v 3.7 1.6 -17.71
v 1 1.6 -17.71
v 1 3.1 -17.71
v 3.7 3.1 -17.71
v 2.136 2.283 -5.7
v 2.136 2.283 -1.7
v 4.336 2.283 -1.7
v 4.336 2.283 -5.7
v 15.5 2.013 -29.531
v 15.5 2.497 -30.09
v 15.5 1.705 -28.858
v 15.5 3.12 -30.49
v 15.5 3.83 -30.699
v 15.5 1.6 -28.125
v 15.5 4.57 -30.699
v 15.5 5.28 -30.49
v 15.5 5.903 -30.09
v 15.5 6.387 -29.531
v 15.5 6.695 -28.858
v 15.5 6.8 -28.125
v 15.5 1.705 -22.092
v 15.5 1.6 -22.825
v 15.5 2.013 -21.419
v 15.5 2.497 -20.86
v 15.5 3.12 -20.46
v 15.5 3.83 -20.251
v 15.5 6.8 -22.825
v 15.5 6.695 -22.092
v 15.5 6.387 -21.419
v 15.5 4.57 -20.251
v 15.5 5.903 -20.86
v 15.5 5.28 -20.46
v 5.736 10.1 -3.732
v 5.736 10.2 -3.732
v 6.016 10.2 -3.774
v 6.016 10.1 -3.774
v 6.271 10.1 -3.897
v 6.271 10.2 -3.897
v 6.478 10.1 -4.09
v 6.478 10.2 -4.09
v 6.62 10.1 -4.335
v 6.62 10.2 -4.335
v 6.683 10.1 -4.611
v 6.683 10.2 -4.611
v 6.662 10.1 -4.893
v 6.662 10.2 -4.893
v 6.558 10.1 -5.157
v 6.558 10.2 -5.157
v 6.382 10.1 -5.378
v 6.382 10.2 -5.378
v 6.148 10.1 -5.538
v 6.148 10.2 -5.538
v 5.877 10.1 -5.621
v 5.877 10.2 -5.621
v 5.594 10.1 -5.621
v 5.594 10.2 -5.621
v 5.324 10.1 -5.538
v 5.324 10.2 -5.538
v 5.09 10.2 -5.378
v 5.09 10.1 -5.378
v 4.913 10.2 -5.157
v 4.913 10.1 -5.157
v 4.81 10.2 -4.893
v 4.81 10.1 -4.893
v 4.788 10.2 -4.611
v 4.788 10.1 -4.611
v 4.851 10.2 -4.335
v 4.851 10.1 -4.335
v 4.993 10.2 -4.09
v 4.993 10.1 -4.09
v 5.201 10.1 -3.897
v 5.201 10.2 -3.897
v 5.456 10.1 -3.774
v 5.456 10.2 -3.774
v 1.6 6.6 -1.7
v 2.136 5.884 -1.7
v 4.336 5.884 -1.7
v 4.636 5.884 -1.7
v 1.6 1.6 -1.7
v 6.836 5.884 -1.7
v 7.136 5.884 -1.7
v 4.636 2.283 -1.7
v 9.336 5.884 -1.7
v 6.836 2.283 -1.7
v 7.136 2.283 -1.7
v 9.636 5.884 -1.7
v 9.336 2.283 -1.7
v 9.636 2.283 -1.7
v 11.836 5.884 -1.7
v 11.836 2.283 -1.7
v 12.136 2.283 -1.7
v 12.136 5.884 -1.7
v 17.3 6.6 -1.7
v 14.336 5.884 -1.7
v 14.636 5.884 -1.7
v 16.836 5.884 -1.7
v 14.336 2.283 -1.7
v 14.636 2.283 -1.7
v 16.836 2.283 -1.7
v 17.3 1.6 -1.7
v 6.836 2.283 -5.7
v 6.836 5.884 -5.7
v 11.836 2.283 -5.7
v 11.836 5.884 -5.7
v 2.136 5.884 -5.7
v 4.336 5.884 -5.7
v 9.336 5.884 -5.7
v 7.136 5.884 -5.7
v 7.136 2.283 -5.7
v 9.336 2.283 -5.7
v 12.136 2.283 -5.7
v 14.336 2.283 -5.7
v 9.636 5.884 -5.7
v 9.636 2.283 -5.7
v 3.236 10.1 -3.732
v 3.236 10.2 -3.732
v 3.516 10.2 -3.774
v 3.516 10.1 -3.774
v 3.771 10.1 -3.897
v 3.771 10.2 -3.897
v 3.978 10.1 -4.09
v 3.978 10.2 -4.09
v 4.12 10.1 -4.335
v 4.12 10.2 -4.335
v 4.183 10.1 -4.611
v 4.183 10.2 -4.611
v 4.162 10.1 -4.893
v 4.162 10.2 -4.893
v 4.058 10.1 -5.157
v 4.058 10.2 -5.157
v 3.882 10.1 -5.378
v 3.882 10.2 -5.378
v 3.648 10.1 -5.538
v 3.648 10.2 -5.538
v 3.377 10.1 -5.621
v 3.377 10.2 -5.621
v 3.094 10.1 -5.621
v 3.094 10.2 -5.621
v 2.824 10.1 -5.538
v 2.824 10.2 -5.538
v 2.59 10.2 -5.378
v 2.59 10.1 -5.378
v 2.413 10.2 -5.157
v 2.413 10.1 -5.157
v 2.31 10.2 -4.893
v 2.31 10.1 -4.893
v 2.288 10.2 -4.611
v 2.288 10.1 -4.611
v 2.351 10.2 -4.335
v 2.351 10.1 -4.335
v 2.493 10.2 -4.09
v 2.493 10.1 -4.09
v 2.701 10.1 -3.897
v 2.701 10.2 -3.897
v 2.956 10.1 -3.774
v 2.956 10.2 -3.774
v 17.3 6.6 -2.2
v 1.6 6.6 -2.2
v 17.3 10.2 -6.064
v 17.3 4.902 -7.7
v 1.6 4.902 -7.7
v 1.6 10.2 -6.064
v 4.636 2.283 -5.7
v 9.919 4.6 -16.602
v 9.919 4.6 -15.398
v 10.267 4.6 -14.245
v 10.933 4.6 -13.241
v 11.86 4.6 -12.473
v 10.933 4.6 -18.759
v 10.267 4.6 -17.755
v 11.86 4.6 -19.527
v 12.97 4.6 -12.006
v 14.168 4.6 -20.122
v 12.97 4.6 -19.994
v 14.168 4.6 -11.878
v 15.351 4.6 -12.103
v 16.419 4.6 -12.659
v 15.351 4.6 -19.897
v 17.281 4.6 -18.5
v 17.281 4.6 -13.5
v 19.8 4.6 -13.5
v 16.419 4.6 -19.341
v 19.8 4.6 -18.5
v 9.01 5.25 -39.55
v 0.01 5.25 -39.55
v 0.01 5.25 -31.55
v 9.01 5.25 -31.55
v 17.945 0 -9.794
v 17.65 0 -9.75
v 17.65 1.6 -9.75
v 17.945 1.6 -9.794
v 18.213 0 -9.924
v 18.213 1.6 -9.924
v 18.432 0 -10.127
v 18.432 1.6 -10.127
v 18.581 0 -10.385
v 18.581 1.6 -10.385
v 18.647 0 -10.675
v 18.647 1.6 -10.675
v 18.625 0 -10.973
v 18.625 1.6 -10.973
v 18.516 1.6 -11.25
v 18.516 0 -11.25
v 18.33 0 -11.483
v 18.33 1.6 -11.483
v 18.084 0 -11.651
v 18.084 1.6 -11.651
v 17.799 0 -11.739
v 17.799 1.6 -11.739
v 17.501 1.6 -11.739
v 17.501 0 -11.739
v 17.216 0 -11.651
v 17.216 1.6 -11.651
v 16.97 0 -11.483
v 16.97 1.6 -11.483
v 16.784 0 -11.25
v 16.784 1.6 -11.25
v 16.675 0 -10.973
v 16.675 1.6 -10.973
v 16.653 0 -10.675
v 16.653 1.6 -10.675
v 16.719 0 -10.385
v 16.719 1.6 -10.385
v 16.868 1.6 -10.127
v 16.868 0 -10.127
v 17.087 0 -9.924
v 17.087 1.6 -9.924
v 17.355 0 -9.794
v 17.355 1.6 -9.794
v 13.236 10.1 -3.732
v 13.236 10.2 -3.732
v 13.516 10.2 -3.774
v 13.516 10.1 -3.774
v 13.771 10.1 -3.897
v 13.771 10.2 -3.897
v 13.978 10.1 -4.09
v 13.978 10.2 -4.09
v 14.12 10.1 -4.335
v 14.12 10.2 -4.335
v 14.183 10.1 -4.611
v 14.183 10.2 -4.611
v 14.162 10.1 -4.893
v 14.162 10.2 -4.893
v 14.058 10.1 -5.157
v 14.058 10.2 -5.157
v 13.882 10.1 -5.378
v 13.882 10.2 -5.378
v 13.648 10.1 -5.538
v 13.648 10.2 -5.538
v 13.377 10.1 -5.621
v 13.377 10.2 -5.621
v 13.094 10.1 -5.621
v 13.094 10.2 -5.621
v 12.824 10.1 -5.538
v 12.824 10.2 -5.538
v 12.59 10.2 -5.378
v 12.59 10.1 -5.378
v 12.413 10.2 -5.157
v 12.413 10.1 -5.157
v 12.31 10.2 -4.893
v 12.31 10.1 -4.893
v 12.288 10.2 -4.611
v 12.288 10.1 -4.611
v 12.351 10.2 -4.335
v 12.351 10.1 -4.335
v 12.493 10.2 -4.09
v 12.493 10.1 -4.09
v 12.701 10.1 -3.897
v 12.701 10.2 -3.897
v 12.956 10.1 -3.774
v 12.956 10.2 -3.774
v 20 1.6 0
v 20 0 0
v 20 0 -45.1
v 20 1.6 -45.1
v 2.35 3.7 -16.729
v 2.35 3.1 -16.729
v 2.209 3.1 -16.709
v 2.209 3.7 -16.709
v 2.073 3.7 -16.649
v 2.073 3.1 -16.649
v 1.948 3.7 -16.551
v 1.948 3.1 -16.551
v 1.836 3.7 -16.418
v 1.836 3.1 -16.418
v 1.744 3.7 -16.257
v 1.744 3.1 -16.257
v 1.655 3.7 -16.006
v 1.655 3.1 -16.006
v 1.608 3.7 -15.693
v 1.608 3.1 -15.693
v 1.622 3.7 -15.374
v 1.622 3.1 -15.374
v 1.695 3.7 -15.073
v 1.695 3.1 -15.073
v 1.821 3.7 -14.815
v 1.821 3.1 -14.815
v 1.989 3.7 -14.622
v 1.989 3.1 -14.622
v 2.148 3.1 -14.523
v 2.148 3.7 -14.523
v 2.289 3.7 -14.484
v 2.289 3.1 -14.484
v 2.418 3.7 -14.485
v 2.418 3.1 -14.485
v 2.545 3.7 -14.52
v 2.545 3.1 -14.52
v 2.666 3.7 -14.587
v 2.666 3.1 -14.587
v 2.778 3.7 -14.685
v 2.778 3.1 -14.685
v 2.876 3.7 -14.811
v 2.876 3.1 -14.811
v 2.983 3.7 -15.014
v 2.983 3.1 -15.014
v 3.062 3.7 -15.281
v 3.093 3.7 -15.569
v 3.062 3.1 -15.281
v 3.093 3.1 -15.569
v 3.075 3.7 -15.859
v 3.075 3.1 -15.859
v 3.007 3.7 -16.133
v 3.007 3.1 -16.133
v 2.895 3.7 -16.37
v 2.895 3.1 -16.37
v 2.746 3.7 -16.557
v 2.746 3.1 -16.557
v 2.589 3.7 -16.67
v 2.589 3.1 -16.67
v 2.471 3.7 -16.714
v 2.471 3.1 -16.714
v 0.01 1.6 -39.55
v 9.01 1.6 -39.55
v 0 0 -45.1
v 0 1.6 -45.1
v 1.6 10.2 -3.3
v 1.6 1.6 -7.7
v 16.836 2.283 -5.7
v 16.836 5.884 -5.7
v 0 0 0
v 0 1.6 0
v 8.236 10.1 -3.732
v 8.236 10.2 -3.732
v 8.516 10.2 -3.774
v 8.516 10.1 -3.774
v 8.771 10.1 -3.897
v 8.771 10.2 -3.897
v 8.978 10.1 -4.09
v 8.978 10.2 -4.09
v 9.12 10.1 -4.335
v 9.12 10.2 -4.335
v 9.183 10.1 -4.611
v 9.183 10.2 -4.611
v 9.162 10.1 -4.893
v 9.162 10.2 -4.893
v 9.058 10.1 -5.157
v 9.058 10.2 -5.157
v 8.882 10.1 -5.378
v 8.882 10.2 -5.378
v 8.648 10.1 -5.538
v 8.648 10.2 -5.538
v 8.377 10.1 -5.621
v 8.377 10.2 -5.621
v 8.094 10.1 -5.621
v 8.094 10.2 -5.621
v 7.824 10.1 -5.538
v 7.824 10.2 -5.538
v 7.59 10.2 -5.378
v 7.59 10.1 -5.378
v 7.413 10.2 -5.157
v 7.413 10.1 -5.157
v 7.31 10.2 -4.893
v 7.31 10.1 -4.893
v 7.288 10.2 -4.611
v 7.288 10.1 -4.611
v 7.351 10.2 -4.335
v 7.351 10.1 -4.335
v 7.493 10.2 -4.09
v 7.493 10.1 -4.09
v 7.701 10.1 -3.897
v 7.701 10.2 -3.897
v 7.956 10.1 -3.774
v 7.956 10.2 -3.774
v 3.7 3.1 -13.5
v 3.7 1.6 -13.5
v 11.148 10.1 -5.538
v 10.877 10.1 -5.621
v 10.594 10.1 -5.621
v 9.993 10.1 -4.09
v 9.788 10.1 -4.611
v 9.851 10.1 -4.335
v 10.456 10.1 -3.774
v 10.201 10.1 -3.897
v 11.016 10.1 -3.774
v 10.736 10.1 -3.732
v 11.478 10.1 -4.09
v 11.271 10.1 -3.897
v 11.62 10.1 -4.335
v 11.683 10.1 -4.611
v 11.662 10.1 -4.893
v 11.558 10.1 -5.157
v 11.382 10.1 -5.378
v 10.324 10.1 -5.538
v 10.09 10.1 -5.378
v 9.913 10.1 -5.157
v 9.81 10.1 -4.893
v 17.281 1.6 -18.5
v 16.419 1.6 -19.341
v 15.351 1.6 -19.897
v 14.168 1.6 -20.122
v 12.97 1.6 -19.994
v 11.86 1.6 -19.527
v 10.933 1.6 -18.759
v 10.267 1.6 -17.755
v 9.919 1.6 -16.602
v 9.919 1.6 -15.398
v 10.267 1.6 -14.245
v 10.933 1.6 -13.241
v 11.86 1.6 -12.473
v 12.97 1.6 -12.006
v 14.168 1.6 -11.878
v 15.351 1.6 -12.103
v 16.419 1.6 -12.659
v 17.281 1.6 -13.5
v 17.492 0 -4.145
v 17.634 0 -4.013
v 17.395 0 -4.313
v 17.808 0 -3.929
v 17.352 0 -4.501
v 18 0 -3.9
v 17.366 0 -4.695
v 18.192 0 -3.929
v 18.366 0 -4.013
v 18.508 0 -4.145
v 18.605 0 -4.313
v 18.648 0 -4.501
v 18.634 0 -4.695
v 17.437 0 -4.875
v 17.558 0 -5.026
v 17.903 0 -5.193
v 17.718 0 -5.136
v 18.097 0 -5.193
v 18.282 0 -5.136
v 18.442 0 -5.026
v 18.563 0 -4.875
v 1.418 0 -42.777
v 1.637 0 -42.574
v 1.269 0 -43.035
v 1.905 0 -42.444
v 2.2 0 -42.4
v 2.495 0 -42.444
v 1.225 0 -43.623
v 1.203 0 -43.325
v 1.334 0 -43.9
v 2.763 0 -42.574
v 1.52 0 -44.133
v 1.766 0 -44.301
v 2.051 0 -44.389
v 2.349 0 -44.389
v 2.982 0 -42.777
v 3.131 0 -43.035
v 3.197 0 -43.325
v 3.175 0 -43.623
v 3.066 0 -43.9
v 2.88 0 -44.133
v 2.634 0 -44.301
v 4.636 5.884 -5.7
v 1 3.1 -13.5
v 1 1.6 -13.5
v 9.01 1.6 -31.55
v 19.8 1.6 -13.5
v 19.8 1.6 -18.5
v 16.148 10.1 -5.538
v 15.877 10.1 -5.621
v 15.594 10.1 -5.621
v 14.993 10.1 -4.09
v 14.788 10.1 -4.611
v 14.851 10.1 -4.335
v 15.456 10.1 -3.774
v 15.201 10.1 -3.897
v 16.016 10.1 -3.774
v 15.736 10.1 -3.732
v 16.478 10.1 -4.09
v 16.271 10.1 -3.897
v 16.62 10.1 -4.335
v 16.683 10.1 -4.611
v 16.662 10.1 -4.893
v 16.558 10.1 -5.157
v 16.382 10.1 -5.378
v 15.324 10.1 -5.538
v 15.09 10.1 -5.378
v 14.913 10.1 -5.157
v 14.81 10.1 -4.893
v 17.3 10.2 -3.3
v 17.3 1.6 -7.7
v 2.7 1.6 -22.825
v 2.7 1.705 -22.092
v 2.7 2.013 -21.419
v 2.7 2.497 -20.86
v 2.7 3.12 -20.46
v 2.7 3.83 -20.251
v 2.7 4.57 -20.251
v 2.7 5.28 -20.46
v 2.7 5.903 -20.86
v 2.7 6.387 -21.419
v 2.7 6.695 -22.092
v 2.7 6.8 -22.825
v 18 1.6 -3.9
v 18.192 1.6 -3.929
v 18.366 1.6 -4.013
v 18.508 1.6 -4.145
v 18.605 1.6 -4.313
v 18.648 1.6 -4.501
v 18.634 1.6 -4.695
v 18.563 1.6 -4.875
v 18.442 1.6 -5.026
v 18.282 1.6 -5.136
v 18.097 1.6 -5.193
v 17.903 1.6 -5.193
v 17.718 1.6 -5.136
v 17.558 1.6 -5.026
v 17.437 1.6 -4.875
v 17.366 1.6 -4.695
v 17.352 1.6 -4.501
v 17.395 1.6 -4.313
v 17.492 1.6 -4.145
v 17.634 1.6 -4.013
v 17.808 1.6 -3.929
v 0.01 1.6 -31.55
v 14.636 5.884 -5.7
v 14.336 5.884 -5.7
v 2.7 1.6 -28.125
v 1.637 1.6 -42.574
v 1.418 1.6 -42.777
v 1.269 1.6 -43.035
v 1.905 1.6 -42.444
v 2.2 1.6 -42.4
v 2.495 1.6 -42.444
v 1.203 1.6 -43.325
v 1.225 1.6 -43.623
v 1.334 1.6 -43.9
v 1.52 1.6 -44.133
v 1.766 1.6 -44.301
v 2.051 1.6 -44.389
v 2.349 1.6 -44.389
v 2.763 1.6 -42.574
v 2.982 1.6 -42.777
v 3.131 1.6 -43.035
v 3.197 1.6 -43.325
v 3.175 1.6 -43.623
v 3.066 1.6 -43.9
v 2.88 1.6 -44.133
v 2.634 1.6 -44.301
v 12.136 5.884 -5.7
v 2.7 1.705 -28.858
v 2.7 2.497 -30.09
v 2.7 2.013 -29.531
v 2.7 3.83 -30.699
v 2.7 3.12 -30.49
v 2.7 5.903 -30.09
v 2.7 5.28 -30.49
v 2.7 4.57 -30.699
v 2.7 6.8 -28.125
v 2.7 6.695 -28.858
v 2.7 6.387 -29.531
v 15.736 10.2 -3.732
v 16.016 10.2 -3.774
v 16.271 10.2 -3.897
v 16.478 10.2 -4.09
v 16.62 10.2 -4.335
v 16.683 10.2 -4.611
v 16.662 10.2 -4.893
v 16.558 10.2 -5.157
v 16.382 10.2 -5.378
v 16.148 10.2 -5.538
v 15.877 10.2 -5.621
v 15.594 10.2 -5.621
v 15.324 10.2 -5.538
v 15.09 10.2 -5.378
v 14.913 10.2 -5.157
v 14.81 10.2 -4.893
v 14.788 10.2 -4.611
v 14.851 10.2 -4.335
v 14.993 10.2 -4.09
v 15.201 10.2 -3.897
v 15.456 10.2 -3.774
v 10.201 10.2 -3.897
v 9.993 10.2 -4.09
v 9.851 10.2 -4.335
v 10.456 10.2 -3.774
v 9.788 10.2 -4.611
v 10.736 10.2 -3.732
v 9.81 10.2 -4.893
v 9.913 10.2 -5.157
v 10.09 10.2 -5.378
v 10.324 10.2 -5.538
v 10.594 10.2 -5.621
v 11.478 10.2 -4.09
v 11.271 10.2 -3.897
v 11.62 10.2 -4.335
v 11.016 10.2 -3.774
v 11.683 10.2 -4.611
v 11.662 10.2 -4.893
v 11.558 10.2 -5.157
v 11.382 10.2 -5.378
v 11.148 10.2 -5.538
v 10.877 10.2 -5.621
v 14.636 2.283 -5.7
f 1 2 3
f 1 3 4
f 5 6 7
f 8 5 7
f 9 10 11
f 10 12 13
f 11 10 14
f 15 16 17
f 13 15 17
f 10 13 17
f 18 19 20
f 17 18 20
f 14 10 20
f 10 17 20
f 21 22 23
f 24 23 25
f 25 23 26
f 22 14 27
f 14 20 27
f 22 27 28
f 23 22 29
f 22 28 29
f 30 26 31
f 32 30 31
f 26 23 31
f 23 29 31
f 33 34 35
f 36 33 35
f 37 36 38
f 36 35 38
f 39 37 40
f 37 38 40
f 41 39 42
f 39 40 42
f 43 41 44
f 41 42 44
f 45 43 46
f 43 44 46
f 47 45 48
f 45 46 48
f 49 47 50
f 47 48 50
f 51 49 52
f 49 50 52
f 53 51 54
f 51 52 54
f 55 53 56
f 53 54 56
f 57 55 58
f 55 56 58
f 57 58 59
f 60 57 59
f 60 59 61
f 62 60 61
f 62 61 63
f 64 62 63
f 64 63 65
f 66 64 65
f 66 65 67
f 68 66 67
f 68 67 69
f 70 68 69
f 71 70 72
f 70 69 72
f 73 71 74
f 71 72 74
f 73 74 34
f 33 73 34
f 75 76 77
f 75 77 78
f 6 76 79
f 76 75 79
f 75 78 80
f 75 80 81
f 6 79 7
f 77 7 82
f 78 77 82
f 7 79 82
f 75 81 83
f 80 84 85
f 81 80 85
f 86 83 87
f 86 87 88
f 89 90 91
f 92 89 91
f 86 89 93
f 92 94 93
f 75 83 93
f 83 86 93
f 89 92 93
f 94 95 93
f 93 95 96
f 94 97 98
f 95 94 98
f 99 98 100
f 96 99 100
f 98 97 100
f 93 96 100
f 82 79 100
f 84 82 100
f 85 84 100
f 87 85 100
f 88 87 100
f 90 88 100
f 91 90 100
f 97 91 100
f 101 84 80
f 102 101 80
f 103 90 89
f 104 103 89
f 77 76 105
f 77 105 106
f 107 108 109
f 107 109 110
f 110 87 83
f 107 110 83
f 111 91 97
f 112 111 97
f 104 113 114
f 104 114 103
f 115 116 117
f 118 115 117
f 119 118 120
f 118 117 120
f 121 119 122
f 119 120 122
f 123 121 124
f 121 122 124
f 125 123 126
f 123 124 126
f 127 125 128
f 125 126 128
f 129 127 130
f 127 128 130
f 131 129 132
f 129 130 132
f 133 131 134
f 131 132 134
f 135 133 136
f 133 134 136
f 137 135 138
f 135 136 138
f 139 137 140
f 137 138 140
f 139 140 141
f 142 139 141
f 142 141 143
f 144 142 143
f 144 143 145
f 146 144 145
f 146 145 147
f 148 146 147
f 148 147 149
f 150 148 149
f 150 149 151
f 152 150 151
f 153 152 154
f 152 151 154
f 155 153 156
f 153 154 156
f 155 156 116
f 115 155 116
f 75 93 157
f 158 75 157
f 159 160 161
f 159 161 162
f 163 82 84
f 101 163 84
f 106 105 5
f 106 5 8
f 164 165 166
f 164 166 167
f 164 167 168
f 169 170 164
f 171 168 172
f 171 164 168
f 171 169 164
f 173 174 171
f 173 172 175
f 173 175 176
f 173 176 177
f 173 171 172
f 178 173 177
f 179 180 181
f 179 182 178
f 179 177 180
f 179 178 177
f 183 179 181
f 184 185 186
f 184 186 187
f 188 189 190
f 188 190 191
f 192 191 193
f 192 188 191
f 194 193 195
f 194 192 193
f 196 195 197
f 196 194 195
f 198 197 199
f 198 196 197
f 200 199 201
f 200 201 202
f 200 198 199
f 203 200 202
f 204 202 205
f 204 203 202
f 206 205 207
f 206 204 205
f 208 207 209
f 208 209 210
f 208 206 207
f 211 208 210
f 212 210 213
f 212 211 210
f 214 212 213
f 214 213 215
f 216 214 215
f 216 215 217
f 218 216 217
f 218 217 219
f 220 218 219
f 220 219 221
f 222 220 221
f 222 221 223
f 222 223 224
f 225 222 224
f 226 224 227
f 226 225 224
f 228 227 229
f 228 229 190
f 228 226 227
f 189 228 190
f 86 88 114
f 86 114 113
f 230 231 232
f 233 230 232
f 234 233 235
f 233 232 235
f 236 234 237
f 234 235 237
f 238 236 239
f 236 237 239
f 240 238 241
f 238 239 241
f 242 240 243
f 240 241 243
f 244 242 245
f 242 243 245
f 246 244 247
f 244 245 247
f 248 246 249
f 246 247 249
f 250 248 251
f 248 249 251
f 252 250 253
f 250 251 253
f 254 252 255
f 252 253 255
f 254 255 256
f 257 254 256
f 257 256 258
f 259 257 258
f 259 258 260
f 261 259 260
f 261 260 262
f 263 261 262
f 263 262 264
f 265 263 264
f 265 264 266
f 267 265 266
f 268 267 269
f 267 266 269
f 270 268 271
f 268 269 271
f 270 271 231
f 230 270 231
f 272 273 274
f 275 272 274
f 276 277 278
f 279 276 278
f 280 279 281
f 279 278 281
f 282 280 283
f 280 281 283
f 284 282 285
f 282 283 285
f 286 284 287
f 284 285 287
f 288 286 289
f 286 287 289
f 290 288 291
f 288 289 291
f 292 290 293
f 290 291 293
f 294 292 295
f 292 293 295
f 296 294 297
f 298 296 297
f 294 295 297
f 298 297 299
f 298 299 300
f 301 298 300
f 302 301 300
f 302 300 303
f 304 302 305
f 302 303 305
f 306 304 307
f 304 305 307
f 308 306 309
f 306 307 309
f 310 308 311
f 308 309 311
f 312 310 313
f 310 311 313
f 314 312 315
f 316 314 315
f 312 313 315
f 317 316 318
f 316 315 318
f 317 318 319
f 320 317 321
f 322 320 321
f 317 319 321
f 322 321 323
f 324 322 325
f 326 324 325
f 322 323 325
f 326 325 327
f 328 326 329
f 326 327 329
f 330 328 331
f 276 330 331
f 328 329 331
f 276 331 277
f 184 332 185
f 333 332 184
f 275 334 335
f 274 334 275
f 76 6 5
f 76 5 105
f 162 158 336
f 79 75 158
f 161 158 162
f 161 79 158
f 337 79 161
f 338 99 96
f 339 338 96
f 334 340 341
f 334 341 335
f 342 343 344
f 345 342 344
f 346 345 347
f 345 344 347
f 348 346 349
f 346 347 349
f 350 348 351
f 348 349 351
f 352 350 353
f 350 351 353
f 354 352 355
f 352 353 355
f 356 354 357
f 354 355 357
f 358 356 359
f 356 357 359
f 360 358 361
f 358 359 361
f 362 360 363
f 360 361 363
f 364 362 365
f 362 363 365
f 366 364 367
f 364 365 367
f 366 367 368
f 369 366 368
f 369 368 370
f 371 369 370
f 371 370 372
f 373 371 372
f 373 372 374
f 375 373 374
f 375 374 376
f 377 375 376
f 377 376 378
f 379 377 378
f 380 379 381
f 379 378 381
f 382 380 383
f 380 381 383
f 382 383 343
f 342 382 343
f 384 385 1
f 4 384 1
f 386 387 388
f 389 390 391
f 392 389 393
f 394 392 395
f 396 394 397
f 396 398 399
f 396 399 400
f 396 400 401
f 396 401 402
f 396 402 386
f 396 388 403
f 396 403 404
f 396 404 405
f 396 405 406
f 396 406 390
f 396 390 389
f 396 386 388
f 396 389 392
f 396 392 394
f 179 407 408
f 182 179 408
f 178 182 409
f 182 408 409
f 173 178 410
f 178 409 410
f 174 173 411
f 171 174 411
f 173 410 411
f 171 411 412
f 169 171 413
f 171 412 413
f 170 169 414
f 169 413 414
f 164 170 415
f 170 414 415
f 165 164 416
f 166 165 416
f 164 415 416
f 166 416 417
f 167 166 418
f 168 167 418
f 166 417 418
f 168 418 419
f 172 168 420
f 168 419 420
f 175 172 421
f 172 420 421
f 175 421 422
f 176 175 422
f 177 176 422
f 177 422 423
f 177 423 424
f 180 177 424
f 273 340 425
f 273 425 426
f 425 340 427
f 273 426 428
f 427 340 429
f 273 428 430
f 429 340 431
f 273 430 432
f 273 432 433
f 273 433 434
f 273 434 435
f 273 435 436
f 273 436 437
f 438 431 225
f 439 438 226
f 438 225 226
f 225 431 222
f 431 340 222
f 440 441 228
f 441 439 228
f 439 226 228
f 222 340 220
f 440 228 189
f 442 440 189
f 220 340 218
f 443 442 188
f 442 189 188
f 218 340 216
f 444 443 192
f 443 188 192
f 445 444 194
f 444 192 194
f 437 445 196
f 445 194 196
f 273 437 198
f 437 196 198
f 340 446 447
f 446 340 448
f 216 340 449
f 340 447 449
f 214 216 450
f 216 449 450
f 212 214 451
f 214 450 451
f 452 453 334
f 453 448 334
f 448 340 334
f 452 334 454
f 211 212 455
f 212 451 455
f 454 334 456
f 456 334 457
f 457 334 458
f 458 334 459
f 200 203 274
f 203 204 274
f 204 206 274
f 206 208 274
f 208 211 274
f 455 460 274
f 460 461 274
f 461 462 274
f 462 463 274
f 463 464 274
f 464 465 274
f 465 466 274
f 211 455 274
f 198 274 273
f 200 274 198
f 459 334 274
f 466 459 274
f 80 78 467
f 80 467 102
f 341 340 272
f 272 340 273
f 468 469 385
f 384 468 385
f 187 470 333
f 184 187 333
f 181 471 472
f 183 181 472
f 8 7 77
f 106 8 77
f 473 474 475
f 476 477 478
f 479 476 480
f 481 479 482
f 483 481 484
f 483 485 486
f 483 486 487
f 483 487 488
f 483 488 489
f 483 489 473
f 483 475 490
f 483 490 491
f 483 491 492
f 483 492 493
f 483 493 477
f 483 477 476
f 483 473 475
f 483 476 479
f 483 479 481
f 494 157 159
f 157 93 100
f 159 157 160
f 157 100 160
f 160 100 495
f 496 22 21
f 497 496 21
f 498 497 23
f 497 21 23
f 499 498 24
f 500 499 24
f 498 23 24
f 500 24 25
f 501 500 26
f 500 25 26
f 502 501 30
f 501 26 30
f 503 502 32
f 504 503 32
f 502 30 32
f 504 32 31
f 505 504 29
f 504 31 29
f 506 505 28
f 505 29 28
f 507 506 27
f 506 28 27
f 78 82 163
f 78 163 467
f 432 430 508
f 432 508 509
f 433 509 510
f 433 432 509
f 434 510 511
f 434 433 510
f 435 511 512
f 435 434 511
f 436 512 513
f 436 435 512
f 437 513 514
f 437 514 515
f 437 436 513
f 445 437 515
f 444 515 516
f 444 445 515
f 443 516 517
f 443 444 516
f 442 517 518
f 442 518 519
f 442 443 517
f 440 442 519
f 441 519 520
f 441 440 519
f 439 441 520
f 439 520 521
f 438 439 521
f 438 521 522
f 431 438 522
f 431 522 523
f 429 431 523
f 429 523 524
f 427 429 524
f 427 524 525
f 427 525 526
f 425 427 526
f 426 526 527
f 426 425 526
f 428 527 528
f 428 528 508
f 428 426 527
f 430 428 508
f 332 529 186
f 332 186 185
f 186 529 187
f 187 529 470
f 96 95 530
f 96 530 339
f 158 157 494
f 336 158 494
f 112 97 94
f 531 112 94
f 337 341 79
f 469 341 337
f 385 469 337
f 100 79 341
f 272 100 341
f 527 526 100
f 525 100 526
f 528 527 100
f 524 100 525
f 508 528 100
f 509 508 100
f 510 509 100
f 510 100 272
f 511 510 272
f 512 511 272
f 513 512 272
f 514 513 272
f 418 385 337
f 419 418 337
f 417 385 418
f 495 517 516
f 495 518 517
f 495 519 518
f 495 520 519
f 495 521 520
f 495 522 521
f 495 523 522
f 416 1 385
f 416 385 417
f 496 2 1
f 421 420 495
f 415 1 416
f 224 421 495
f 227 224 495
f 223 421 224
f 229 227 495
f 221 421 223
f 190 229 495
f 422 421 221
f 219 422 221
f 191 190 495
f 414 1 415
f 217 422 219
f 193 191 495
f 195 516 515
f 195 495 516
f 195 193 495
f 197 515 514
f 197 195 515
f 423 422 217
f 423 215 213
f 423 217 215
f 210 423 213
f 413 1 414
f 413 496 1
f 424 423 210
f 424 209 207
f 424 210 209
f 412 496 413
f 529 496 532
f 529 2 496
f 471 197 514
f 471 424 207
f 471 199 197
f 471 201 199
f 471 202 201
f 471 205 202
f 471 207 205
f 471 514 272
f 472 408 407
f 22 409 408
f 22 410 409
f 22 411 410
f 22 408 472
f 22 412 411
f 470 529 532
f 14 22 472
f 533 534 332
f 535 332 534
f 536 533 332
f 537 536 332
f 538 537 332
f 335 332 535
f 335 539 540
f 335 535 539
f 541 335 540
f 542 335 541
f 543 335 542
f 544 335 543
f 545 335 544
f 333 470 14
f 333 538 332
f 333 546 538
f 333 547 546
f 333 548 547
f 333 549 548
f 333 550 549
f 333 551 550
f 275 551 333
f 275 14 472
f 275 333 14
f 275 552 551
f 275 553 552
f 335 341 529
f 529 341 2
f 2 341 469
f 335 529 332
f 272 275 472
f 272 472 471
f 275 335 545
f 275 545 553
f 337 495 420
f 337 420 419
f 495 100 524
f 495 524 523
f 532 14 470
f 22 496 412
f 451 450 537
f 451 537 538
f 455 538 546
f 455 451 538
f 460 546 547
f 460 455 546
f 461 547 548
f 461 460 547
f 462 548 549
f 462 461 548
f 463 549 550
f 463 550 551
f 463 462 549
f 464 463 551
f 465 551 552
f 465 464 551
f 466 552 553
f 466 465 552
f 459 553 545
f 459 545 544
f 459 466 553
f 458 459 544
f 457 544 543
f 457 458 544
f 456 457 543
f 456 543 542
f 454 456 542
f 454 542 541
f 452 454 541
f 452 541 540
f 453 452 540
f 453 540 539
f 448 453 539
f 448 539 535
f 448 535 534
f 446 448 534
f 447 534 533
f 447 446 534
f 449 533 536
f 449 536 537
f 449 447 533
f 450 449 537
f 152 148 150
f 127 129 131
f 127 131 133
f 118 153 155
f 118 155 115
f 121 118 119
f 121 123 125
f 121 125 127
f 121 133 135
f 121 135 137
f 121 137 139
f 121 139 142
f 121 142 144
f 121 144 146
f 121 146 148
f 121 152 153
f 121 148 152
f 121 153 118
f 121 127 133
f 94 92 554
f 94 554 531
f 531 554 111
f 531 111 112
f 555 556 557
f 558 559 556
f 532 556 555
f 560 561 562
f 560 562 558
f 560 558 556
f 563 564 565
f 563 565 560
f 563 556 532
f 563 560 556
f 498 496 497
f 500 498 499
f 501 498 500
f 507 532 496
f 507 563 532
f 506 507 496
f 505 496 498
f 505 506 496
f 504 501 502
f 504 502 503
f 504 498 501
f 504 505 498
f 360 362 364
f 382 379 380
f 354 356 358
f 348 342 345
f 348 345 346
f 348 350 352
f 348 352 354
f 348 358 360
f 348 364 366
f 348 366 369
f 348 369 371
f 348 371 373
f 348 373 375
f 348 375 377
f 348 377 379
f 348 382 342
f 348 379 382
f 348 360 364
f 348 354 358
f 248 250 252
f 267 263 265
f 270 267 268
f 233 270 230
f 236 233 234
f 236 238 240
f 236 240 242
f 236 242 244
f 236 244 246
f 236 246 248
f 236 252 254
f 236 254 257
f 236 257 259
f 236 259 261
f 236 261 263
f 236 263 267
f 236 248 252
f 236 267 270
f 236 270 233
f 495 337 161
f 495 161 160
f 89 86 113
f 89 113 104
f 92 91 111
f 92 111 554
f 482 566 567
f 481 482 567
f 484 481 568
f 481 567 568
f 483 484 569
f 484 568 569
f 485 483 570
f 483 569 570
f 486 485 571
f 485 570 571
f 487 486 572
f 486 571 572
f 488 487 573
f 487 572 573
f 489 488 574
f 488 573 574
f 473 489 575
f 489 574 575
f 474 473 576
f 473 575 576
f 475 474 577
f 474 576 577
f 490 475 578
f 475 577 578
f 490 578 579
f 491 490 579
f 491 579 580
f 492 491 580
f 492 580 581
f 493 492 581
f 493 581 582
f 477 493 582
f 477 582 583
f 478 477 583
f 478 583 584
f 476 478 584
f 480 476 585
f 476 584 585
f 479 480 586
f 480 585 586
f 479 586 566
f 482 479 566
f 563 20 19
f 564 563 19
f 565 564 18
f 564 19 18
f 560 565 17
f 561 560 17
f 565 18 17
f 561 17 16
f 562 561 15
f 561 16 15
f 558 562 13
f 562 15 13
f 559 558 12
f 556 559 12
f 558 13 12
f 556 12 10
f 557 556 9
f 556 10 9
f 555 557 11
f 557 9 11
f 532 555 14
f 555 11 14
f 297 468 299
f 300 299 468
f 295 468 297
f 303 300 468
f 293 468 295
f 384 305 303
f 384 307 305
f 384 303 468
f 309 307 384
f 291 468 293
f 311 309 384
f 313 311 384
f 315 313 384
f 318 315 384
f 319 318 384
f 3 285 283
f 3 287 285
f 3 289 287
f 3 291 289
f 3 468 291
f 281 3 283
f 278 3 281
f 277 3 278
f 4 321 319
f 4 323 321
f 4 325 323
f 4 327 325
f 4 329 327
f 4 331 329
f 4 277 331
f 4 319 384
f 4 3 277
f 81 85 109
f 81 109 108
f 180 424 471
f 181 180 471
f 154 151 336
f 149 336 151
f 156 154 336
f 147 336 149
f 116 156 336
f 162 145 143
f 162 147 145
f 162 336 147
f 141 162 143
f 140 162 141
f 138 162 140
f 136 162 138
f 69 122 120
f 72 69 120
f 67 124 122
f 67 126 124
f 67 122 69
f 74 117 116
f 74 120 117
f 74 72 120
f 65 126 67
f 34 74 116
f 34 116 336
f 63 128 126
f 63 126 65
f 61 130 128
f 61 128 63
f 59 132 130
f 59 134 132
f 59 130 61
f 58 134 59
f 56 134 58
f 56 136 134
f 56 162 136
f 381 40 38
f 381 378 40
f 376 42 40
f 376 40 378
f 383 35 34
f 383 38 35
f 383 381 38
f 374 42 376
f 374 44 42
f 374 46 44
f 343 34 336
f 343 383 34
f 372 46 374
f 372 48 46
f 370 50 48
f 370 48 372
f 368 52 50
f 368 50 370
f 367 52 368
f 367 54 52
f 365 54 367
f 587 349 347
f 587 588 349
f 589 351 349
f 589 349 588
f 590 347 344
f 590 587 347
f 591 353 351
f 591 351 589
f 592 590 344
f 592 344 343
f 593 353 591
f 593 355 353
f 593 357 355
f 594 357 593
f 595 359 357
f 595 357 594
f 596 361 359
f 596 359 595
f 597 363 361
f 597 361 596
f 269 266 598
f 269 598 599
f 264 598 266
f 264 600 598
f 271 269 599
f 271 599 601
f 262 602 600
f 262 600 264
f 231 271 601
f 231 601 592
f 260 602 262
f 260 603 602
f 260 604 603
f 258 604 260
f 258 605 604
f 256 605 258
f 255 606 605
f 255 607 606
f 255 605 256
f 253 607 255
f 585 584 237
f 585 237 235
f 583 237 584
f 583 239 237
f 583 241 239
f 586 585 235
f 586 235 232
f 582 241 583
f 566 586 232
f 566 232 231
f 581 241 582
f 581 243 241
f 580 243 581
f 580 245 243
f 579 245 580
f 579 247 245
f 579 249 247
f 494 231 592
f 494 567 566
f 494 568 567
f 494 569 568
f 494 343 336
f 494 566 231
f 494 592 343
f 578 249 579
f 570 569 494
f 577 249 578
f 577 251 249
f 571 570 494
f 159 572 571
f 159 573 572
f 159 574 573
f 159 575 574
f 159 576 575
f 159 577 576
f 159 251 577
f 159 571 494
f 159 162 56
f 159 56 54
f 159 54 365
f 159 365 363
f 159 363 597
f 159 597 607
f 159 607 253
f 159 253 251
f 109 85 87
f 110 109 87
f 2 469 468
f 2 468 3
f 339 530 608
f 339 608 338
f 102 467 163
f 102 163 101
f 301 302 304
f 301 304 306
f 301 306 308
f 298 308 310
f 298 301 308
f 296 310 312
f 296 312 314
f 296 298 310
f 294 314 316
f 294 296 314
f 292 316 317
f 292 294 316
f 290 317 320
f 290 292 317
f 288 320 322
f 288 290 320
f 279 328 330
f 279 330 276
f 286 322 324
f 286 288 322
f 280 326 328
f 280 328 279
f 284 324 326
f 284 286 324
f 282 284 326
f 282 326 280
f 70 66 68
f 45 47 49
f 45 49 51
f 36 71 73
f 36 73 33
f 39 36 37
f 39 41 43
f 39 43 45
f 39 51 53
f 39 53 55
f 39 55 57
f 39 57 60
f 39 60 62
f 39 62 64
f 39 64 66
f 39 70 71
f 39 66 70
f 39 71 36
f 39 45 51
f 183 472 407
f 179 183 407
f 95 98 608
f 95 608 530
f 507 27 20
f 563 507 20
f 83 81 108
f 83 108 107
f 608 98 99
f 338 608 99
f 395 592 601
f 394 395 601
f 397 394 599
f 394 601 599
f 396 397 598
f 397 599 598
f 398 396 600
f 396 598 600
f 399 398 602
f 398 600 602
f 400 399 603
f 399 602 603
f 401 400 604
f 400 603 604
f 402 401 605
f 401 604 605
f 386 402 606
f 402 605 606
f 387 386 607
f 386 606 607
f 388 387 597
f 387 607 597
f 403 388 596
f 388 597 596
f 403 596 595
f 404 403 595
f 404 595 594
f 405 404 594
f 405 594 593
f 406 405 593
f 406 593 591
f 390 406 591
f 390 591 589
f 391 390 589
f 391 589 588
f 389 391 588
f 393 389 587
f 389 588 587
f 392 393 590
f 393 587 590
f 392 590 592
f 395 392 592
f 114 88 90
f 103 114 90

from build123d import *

# Parameters (mm, degrees)
SKETCH1_W           = 20
SKETCH1_H           = 45.1
SKETCH1_R           = 1
SKETCH1_R_2         = 0.65
BOSS_EXTRUDE1_DEPTH = 1.6
SKETCH2_W           = 15.7
SKETCH2_H           = 6
BOSS_EXTRUDE2_DEPTH = 8.6
CUT_EXTRUDE1_DEPTH  = 18.3
SKETCH4_W           = 2.2
SKETCH4_H           = 3.601430215
CUT_EXTRUDE2_DEPTH  = 4
SKETCH5_R           = 0.95
CUT_EXTRUDE3_DEPTH  = 0.1
SKETCH6_W           = 2.7
SKETCH6_H           = 4.21
BOSS_EXTRUDE3_DEPTH = 1.5
SKETCH7_RX          = 1.124329337
SKETCH7_RY          = 0.743812381
BOSS_EXTRUDE4_DEPTH = 0.6
BOSS_EXTRUDE5_DEPTH = 3
BOSS_EXTRUDE6_DEPTH = 12.8
SKETCH10_W          = 9
SKETCH10_H          = 8
BOSS_EXTRUDE7_DEPTH = 3.65


with BuildPart() as part:
    # Sketch1 → Boss-Extrude1 (new body)
    with BuildSketch(Plane(origin=(0, 0, 0), x_dir=(1, 0, 0), z_dir=(0, 1, 0))):
        with Locations((10, 22.55)):
            Rectangle(SKETCH1_W, SKETCH1_H)
        with Locations(Location((2.2, 43.4, 0), (0, 0, 270))):  # turned: the seam where the file's is
            Circle(SKETCH1_R, mode=Mode.SUBTRACT)
        with Locations(Location((17.65, 10.75, 0), (0, 0, 270))):  # turned: the seam where the file's is
            Circle(SKETCH1_R, mode=Mode.SUBTRACT)
        with Locations(Location((18, 4.55, 0), (0, 0, 270))):  # turned: the seam where the file's is
            Circle(SKETCH1_R_2, mode=Mode.SUBTRACT)
    extrude(amount=BOSS_EXTRUDE1_DEPTH)

    # Sketch2 → Boss-Extrude2 (add)
    with BuildSketch(Plane(origin=(0, 1.6, 0), x_dir=(1, 0, 0), z_dir=(0, 1, 0))):
        with Locations((9.45, 4.7)):
            Rectangle(SKETCH2_W, SKETCH2_H)
    extrude(amount=BOSS_EXTRUDE2_DEPTH)

    # Sketch3 → Cut-Extrude1 (cut, through all)
    with BuildSketch(Plane(origin=(17.3, 0, 0), x_dir=(0, 0, -1), z_dir=(1, 0, 0))):
        Polygon((1.7, 6.6), (2.2, 6.6), (3.3, 10.2), (1.7, 10.2), align=None)
        Polygon((6.063741388, 10.2), (7.7, 10.2), (7.7, 4.901672733), align=None)
    extrude(amount=-CUT_EXTRUDE1_DEPTH, mode=Mode.SUBTRACT)

    # Sketch4 → Cut-Extrude2 (cut)
    with BuildSketch(Plane.XY.offset(-1.7)):
        with Locations((5.735754943, 4.083777336)):
            Rectangle(SKETCH4_W, SKETCH4_H)
        with Locations((3.235754943, 4.083777336)):
            Rectangle(SKETCH4_W, SKETCH4_H)
        with Locations((8.235754943, 4.083777336)):
            Rectangle(SKETCH4_W, SKETCH4_H)
        with Locations((10.735754943, 4.083777336)):
            Rectangle(SKETCH4_W, SKETCH4_H)
        with Locations((13.235754943, 4.083777336)):
            Rectangle(SKETCH4_W, SKETCH4_H)
        with Locations((15.735754943, 4.083777336)):
            Rectangle(SKETCH4_W, SKETCH4_H)
    extrude(amount=-CUT_EXTRUDE2_DEPTH, mode=Mode.SUBTRACT)

    # Sketch5 → Cut-Extrude3 (cut)
    with BuildSketch(Plane(origin=(0, 10.2, 0), x_dir=(1, 0, 0), z_dir=(0, 1, 0))):
        with Locations(Location((3.235754943, 4.681870694, 0), (0, 0, 270))):  # turned: the seam where the file's is
            Circle(SKETCH5_R)
        with Locations(Location((5.735754943, 4.681870694, 0), (0, 0, 270))):  # turned: the seam where the file's is
            Circle(SKETCH5_R)
        with Locations(Location((8.235754943, 4.681870694, 0), (0, 0, 270))):  # turned: the seam where the file's is
            Circle(SKETCH5_R)
        with Locations(Location((10.735754943, 4.681870694, 0), (0, 0, 270))):  # turned: the seam where the file's is
            Circle(SKETCH5_R)
        with Locations(Location((13.235754943, 4.681870694, 0), (0, 0, 270))):  # turned: the seam where the file's is
            Circle(SKETCH5_R)
        with Locations(Location((15.735754943, 4.681870694, 0), (0, 0, 270))):  # turned: the seam where the file's is
            Circle(SKETCH5_R)
    extrude(amount=-CUT_EXTRUDE3_DEPTH, mode=Mode.SUBTRACT)

    # Sketch6 → Boss-Extrude3 (add)
    with BuildSketch(Plane(origin=(0, 1.6, 0), x_dir=(1, 0, 0), z_dir=(0, 1, 0))):
        with Locations((2.35, 15.605)):
            Rectangle(SKETCH6_W, SKETCH6_H)
    extrude(amount=BOSS_EXTRUDE3_DEPTH)

    # Sketch7 → Boss-Extrude4 (add)
    with BuildSketch(Plane(origin=(0, 3.1, 0), x_dir=(1, 0, 0), z_dir=(0, 1, 0))):
        with Locations(Location((2.35, 15.605), (0, 0, 90))):
            Ellipse(SKETCH7_RX, SKETCH7_RY)
    extrude(amount=BOSS_EXTRUDE4_DEPTH)

    # Sketch8 → Boss-Extrude5 (add)
    with BuildSketch(Plane(origin=(0, 1.6, 0), x_dir=(1, 0, 0), z_dir=(0, 1, 0))):
        with BuildLine():
            Line((17.281101187, 13.5), (19.8, 13.5))
            Line((19.8, 13.5), (19.8, 18.5))
            Line((19.8, 18.5), (17.281101187, 18.5))
            ThreePointArc((17.281101187, 18.5), (9.875, 16), (17.281101187, 13.5))
        make_face()
    extrude(amount=BOSS_EXTRUDE5_DEPTH)

    # Sketch9 → Boss-Extrude6 (add)
    with BuildSketch(Plane(origin=(15.5, 0, 0), x_dir=(0, 0, -1), z_dir=(1, 0, 0))):
        with BuildLine():
            Line((22.825, 6.8), (28.125, 6.8))
            ThreePointArc((28.125, 6.8), (30.725, 4.2), (28.125, 1.6))
            Line((28.125, 1.6), (22.825, 1.6))
            ThreePointArc((22.825, 1.6), (20.225, 4.2), (22.825, 6.8))
        make_face()
    extrude(amount=-BOSS_EXTRUDE6_DEPTH)

    # Sketch10 → Boss-Extrude7 (add)
    with BuildSketch(Plane(origin=(0, 1.6, 0), x_dir=(1, 0, 0), z_dir=(0, 1, 0))):
        with Locations((4.51, 35.55)):
            Rectangle(SKETCH10_W, SKETCH10_H)
    extrude(amount=BOSS_EXTRUDE7_DEPTH)


solid = part.part
